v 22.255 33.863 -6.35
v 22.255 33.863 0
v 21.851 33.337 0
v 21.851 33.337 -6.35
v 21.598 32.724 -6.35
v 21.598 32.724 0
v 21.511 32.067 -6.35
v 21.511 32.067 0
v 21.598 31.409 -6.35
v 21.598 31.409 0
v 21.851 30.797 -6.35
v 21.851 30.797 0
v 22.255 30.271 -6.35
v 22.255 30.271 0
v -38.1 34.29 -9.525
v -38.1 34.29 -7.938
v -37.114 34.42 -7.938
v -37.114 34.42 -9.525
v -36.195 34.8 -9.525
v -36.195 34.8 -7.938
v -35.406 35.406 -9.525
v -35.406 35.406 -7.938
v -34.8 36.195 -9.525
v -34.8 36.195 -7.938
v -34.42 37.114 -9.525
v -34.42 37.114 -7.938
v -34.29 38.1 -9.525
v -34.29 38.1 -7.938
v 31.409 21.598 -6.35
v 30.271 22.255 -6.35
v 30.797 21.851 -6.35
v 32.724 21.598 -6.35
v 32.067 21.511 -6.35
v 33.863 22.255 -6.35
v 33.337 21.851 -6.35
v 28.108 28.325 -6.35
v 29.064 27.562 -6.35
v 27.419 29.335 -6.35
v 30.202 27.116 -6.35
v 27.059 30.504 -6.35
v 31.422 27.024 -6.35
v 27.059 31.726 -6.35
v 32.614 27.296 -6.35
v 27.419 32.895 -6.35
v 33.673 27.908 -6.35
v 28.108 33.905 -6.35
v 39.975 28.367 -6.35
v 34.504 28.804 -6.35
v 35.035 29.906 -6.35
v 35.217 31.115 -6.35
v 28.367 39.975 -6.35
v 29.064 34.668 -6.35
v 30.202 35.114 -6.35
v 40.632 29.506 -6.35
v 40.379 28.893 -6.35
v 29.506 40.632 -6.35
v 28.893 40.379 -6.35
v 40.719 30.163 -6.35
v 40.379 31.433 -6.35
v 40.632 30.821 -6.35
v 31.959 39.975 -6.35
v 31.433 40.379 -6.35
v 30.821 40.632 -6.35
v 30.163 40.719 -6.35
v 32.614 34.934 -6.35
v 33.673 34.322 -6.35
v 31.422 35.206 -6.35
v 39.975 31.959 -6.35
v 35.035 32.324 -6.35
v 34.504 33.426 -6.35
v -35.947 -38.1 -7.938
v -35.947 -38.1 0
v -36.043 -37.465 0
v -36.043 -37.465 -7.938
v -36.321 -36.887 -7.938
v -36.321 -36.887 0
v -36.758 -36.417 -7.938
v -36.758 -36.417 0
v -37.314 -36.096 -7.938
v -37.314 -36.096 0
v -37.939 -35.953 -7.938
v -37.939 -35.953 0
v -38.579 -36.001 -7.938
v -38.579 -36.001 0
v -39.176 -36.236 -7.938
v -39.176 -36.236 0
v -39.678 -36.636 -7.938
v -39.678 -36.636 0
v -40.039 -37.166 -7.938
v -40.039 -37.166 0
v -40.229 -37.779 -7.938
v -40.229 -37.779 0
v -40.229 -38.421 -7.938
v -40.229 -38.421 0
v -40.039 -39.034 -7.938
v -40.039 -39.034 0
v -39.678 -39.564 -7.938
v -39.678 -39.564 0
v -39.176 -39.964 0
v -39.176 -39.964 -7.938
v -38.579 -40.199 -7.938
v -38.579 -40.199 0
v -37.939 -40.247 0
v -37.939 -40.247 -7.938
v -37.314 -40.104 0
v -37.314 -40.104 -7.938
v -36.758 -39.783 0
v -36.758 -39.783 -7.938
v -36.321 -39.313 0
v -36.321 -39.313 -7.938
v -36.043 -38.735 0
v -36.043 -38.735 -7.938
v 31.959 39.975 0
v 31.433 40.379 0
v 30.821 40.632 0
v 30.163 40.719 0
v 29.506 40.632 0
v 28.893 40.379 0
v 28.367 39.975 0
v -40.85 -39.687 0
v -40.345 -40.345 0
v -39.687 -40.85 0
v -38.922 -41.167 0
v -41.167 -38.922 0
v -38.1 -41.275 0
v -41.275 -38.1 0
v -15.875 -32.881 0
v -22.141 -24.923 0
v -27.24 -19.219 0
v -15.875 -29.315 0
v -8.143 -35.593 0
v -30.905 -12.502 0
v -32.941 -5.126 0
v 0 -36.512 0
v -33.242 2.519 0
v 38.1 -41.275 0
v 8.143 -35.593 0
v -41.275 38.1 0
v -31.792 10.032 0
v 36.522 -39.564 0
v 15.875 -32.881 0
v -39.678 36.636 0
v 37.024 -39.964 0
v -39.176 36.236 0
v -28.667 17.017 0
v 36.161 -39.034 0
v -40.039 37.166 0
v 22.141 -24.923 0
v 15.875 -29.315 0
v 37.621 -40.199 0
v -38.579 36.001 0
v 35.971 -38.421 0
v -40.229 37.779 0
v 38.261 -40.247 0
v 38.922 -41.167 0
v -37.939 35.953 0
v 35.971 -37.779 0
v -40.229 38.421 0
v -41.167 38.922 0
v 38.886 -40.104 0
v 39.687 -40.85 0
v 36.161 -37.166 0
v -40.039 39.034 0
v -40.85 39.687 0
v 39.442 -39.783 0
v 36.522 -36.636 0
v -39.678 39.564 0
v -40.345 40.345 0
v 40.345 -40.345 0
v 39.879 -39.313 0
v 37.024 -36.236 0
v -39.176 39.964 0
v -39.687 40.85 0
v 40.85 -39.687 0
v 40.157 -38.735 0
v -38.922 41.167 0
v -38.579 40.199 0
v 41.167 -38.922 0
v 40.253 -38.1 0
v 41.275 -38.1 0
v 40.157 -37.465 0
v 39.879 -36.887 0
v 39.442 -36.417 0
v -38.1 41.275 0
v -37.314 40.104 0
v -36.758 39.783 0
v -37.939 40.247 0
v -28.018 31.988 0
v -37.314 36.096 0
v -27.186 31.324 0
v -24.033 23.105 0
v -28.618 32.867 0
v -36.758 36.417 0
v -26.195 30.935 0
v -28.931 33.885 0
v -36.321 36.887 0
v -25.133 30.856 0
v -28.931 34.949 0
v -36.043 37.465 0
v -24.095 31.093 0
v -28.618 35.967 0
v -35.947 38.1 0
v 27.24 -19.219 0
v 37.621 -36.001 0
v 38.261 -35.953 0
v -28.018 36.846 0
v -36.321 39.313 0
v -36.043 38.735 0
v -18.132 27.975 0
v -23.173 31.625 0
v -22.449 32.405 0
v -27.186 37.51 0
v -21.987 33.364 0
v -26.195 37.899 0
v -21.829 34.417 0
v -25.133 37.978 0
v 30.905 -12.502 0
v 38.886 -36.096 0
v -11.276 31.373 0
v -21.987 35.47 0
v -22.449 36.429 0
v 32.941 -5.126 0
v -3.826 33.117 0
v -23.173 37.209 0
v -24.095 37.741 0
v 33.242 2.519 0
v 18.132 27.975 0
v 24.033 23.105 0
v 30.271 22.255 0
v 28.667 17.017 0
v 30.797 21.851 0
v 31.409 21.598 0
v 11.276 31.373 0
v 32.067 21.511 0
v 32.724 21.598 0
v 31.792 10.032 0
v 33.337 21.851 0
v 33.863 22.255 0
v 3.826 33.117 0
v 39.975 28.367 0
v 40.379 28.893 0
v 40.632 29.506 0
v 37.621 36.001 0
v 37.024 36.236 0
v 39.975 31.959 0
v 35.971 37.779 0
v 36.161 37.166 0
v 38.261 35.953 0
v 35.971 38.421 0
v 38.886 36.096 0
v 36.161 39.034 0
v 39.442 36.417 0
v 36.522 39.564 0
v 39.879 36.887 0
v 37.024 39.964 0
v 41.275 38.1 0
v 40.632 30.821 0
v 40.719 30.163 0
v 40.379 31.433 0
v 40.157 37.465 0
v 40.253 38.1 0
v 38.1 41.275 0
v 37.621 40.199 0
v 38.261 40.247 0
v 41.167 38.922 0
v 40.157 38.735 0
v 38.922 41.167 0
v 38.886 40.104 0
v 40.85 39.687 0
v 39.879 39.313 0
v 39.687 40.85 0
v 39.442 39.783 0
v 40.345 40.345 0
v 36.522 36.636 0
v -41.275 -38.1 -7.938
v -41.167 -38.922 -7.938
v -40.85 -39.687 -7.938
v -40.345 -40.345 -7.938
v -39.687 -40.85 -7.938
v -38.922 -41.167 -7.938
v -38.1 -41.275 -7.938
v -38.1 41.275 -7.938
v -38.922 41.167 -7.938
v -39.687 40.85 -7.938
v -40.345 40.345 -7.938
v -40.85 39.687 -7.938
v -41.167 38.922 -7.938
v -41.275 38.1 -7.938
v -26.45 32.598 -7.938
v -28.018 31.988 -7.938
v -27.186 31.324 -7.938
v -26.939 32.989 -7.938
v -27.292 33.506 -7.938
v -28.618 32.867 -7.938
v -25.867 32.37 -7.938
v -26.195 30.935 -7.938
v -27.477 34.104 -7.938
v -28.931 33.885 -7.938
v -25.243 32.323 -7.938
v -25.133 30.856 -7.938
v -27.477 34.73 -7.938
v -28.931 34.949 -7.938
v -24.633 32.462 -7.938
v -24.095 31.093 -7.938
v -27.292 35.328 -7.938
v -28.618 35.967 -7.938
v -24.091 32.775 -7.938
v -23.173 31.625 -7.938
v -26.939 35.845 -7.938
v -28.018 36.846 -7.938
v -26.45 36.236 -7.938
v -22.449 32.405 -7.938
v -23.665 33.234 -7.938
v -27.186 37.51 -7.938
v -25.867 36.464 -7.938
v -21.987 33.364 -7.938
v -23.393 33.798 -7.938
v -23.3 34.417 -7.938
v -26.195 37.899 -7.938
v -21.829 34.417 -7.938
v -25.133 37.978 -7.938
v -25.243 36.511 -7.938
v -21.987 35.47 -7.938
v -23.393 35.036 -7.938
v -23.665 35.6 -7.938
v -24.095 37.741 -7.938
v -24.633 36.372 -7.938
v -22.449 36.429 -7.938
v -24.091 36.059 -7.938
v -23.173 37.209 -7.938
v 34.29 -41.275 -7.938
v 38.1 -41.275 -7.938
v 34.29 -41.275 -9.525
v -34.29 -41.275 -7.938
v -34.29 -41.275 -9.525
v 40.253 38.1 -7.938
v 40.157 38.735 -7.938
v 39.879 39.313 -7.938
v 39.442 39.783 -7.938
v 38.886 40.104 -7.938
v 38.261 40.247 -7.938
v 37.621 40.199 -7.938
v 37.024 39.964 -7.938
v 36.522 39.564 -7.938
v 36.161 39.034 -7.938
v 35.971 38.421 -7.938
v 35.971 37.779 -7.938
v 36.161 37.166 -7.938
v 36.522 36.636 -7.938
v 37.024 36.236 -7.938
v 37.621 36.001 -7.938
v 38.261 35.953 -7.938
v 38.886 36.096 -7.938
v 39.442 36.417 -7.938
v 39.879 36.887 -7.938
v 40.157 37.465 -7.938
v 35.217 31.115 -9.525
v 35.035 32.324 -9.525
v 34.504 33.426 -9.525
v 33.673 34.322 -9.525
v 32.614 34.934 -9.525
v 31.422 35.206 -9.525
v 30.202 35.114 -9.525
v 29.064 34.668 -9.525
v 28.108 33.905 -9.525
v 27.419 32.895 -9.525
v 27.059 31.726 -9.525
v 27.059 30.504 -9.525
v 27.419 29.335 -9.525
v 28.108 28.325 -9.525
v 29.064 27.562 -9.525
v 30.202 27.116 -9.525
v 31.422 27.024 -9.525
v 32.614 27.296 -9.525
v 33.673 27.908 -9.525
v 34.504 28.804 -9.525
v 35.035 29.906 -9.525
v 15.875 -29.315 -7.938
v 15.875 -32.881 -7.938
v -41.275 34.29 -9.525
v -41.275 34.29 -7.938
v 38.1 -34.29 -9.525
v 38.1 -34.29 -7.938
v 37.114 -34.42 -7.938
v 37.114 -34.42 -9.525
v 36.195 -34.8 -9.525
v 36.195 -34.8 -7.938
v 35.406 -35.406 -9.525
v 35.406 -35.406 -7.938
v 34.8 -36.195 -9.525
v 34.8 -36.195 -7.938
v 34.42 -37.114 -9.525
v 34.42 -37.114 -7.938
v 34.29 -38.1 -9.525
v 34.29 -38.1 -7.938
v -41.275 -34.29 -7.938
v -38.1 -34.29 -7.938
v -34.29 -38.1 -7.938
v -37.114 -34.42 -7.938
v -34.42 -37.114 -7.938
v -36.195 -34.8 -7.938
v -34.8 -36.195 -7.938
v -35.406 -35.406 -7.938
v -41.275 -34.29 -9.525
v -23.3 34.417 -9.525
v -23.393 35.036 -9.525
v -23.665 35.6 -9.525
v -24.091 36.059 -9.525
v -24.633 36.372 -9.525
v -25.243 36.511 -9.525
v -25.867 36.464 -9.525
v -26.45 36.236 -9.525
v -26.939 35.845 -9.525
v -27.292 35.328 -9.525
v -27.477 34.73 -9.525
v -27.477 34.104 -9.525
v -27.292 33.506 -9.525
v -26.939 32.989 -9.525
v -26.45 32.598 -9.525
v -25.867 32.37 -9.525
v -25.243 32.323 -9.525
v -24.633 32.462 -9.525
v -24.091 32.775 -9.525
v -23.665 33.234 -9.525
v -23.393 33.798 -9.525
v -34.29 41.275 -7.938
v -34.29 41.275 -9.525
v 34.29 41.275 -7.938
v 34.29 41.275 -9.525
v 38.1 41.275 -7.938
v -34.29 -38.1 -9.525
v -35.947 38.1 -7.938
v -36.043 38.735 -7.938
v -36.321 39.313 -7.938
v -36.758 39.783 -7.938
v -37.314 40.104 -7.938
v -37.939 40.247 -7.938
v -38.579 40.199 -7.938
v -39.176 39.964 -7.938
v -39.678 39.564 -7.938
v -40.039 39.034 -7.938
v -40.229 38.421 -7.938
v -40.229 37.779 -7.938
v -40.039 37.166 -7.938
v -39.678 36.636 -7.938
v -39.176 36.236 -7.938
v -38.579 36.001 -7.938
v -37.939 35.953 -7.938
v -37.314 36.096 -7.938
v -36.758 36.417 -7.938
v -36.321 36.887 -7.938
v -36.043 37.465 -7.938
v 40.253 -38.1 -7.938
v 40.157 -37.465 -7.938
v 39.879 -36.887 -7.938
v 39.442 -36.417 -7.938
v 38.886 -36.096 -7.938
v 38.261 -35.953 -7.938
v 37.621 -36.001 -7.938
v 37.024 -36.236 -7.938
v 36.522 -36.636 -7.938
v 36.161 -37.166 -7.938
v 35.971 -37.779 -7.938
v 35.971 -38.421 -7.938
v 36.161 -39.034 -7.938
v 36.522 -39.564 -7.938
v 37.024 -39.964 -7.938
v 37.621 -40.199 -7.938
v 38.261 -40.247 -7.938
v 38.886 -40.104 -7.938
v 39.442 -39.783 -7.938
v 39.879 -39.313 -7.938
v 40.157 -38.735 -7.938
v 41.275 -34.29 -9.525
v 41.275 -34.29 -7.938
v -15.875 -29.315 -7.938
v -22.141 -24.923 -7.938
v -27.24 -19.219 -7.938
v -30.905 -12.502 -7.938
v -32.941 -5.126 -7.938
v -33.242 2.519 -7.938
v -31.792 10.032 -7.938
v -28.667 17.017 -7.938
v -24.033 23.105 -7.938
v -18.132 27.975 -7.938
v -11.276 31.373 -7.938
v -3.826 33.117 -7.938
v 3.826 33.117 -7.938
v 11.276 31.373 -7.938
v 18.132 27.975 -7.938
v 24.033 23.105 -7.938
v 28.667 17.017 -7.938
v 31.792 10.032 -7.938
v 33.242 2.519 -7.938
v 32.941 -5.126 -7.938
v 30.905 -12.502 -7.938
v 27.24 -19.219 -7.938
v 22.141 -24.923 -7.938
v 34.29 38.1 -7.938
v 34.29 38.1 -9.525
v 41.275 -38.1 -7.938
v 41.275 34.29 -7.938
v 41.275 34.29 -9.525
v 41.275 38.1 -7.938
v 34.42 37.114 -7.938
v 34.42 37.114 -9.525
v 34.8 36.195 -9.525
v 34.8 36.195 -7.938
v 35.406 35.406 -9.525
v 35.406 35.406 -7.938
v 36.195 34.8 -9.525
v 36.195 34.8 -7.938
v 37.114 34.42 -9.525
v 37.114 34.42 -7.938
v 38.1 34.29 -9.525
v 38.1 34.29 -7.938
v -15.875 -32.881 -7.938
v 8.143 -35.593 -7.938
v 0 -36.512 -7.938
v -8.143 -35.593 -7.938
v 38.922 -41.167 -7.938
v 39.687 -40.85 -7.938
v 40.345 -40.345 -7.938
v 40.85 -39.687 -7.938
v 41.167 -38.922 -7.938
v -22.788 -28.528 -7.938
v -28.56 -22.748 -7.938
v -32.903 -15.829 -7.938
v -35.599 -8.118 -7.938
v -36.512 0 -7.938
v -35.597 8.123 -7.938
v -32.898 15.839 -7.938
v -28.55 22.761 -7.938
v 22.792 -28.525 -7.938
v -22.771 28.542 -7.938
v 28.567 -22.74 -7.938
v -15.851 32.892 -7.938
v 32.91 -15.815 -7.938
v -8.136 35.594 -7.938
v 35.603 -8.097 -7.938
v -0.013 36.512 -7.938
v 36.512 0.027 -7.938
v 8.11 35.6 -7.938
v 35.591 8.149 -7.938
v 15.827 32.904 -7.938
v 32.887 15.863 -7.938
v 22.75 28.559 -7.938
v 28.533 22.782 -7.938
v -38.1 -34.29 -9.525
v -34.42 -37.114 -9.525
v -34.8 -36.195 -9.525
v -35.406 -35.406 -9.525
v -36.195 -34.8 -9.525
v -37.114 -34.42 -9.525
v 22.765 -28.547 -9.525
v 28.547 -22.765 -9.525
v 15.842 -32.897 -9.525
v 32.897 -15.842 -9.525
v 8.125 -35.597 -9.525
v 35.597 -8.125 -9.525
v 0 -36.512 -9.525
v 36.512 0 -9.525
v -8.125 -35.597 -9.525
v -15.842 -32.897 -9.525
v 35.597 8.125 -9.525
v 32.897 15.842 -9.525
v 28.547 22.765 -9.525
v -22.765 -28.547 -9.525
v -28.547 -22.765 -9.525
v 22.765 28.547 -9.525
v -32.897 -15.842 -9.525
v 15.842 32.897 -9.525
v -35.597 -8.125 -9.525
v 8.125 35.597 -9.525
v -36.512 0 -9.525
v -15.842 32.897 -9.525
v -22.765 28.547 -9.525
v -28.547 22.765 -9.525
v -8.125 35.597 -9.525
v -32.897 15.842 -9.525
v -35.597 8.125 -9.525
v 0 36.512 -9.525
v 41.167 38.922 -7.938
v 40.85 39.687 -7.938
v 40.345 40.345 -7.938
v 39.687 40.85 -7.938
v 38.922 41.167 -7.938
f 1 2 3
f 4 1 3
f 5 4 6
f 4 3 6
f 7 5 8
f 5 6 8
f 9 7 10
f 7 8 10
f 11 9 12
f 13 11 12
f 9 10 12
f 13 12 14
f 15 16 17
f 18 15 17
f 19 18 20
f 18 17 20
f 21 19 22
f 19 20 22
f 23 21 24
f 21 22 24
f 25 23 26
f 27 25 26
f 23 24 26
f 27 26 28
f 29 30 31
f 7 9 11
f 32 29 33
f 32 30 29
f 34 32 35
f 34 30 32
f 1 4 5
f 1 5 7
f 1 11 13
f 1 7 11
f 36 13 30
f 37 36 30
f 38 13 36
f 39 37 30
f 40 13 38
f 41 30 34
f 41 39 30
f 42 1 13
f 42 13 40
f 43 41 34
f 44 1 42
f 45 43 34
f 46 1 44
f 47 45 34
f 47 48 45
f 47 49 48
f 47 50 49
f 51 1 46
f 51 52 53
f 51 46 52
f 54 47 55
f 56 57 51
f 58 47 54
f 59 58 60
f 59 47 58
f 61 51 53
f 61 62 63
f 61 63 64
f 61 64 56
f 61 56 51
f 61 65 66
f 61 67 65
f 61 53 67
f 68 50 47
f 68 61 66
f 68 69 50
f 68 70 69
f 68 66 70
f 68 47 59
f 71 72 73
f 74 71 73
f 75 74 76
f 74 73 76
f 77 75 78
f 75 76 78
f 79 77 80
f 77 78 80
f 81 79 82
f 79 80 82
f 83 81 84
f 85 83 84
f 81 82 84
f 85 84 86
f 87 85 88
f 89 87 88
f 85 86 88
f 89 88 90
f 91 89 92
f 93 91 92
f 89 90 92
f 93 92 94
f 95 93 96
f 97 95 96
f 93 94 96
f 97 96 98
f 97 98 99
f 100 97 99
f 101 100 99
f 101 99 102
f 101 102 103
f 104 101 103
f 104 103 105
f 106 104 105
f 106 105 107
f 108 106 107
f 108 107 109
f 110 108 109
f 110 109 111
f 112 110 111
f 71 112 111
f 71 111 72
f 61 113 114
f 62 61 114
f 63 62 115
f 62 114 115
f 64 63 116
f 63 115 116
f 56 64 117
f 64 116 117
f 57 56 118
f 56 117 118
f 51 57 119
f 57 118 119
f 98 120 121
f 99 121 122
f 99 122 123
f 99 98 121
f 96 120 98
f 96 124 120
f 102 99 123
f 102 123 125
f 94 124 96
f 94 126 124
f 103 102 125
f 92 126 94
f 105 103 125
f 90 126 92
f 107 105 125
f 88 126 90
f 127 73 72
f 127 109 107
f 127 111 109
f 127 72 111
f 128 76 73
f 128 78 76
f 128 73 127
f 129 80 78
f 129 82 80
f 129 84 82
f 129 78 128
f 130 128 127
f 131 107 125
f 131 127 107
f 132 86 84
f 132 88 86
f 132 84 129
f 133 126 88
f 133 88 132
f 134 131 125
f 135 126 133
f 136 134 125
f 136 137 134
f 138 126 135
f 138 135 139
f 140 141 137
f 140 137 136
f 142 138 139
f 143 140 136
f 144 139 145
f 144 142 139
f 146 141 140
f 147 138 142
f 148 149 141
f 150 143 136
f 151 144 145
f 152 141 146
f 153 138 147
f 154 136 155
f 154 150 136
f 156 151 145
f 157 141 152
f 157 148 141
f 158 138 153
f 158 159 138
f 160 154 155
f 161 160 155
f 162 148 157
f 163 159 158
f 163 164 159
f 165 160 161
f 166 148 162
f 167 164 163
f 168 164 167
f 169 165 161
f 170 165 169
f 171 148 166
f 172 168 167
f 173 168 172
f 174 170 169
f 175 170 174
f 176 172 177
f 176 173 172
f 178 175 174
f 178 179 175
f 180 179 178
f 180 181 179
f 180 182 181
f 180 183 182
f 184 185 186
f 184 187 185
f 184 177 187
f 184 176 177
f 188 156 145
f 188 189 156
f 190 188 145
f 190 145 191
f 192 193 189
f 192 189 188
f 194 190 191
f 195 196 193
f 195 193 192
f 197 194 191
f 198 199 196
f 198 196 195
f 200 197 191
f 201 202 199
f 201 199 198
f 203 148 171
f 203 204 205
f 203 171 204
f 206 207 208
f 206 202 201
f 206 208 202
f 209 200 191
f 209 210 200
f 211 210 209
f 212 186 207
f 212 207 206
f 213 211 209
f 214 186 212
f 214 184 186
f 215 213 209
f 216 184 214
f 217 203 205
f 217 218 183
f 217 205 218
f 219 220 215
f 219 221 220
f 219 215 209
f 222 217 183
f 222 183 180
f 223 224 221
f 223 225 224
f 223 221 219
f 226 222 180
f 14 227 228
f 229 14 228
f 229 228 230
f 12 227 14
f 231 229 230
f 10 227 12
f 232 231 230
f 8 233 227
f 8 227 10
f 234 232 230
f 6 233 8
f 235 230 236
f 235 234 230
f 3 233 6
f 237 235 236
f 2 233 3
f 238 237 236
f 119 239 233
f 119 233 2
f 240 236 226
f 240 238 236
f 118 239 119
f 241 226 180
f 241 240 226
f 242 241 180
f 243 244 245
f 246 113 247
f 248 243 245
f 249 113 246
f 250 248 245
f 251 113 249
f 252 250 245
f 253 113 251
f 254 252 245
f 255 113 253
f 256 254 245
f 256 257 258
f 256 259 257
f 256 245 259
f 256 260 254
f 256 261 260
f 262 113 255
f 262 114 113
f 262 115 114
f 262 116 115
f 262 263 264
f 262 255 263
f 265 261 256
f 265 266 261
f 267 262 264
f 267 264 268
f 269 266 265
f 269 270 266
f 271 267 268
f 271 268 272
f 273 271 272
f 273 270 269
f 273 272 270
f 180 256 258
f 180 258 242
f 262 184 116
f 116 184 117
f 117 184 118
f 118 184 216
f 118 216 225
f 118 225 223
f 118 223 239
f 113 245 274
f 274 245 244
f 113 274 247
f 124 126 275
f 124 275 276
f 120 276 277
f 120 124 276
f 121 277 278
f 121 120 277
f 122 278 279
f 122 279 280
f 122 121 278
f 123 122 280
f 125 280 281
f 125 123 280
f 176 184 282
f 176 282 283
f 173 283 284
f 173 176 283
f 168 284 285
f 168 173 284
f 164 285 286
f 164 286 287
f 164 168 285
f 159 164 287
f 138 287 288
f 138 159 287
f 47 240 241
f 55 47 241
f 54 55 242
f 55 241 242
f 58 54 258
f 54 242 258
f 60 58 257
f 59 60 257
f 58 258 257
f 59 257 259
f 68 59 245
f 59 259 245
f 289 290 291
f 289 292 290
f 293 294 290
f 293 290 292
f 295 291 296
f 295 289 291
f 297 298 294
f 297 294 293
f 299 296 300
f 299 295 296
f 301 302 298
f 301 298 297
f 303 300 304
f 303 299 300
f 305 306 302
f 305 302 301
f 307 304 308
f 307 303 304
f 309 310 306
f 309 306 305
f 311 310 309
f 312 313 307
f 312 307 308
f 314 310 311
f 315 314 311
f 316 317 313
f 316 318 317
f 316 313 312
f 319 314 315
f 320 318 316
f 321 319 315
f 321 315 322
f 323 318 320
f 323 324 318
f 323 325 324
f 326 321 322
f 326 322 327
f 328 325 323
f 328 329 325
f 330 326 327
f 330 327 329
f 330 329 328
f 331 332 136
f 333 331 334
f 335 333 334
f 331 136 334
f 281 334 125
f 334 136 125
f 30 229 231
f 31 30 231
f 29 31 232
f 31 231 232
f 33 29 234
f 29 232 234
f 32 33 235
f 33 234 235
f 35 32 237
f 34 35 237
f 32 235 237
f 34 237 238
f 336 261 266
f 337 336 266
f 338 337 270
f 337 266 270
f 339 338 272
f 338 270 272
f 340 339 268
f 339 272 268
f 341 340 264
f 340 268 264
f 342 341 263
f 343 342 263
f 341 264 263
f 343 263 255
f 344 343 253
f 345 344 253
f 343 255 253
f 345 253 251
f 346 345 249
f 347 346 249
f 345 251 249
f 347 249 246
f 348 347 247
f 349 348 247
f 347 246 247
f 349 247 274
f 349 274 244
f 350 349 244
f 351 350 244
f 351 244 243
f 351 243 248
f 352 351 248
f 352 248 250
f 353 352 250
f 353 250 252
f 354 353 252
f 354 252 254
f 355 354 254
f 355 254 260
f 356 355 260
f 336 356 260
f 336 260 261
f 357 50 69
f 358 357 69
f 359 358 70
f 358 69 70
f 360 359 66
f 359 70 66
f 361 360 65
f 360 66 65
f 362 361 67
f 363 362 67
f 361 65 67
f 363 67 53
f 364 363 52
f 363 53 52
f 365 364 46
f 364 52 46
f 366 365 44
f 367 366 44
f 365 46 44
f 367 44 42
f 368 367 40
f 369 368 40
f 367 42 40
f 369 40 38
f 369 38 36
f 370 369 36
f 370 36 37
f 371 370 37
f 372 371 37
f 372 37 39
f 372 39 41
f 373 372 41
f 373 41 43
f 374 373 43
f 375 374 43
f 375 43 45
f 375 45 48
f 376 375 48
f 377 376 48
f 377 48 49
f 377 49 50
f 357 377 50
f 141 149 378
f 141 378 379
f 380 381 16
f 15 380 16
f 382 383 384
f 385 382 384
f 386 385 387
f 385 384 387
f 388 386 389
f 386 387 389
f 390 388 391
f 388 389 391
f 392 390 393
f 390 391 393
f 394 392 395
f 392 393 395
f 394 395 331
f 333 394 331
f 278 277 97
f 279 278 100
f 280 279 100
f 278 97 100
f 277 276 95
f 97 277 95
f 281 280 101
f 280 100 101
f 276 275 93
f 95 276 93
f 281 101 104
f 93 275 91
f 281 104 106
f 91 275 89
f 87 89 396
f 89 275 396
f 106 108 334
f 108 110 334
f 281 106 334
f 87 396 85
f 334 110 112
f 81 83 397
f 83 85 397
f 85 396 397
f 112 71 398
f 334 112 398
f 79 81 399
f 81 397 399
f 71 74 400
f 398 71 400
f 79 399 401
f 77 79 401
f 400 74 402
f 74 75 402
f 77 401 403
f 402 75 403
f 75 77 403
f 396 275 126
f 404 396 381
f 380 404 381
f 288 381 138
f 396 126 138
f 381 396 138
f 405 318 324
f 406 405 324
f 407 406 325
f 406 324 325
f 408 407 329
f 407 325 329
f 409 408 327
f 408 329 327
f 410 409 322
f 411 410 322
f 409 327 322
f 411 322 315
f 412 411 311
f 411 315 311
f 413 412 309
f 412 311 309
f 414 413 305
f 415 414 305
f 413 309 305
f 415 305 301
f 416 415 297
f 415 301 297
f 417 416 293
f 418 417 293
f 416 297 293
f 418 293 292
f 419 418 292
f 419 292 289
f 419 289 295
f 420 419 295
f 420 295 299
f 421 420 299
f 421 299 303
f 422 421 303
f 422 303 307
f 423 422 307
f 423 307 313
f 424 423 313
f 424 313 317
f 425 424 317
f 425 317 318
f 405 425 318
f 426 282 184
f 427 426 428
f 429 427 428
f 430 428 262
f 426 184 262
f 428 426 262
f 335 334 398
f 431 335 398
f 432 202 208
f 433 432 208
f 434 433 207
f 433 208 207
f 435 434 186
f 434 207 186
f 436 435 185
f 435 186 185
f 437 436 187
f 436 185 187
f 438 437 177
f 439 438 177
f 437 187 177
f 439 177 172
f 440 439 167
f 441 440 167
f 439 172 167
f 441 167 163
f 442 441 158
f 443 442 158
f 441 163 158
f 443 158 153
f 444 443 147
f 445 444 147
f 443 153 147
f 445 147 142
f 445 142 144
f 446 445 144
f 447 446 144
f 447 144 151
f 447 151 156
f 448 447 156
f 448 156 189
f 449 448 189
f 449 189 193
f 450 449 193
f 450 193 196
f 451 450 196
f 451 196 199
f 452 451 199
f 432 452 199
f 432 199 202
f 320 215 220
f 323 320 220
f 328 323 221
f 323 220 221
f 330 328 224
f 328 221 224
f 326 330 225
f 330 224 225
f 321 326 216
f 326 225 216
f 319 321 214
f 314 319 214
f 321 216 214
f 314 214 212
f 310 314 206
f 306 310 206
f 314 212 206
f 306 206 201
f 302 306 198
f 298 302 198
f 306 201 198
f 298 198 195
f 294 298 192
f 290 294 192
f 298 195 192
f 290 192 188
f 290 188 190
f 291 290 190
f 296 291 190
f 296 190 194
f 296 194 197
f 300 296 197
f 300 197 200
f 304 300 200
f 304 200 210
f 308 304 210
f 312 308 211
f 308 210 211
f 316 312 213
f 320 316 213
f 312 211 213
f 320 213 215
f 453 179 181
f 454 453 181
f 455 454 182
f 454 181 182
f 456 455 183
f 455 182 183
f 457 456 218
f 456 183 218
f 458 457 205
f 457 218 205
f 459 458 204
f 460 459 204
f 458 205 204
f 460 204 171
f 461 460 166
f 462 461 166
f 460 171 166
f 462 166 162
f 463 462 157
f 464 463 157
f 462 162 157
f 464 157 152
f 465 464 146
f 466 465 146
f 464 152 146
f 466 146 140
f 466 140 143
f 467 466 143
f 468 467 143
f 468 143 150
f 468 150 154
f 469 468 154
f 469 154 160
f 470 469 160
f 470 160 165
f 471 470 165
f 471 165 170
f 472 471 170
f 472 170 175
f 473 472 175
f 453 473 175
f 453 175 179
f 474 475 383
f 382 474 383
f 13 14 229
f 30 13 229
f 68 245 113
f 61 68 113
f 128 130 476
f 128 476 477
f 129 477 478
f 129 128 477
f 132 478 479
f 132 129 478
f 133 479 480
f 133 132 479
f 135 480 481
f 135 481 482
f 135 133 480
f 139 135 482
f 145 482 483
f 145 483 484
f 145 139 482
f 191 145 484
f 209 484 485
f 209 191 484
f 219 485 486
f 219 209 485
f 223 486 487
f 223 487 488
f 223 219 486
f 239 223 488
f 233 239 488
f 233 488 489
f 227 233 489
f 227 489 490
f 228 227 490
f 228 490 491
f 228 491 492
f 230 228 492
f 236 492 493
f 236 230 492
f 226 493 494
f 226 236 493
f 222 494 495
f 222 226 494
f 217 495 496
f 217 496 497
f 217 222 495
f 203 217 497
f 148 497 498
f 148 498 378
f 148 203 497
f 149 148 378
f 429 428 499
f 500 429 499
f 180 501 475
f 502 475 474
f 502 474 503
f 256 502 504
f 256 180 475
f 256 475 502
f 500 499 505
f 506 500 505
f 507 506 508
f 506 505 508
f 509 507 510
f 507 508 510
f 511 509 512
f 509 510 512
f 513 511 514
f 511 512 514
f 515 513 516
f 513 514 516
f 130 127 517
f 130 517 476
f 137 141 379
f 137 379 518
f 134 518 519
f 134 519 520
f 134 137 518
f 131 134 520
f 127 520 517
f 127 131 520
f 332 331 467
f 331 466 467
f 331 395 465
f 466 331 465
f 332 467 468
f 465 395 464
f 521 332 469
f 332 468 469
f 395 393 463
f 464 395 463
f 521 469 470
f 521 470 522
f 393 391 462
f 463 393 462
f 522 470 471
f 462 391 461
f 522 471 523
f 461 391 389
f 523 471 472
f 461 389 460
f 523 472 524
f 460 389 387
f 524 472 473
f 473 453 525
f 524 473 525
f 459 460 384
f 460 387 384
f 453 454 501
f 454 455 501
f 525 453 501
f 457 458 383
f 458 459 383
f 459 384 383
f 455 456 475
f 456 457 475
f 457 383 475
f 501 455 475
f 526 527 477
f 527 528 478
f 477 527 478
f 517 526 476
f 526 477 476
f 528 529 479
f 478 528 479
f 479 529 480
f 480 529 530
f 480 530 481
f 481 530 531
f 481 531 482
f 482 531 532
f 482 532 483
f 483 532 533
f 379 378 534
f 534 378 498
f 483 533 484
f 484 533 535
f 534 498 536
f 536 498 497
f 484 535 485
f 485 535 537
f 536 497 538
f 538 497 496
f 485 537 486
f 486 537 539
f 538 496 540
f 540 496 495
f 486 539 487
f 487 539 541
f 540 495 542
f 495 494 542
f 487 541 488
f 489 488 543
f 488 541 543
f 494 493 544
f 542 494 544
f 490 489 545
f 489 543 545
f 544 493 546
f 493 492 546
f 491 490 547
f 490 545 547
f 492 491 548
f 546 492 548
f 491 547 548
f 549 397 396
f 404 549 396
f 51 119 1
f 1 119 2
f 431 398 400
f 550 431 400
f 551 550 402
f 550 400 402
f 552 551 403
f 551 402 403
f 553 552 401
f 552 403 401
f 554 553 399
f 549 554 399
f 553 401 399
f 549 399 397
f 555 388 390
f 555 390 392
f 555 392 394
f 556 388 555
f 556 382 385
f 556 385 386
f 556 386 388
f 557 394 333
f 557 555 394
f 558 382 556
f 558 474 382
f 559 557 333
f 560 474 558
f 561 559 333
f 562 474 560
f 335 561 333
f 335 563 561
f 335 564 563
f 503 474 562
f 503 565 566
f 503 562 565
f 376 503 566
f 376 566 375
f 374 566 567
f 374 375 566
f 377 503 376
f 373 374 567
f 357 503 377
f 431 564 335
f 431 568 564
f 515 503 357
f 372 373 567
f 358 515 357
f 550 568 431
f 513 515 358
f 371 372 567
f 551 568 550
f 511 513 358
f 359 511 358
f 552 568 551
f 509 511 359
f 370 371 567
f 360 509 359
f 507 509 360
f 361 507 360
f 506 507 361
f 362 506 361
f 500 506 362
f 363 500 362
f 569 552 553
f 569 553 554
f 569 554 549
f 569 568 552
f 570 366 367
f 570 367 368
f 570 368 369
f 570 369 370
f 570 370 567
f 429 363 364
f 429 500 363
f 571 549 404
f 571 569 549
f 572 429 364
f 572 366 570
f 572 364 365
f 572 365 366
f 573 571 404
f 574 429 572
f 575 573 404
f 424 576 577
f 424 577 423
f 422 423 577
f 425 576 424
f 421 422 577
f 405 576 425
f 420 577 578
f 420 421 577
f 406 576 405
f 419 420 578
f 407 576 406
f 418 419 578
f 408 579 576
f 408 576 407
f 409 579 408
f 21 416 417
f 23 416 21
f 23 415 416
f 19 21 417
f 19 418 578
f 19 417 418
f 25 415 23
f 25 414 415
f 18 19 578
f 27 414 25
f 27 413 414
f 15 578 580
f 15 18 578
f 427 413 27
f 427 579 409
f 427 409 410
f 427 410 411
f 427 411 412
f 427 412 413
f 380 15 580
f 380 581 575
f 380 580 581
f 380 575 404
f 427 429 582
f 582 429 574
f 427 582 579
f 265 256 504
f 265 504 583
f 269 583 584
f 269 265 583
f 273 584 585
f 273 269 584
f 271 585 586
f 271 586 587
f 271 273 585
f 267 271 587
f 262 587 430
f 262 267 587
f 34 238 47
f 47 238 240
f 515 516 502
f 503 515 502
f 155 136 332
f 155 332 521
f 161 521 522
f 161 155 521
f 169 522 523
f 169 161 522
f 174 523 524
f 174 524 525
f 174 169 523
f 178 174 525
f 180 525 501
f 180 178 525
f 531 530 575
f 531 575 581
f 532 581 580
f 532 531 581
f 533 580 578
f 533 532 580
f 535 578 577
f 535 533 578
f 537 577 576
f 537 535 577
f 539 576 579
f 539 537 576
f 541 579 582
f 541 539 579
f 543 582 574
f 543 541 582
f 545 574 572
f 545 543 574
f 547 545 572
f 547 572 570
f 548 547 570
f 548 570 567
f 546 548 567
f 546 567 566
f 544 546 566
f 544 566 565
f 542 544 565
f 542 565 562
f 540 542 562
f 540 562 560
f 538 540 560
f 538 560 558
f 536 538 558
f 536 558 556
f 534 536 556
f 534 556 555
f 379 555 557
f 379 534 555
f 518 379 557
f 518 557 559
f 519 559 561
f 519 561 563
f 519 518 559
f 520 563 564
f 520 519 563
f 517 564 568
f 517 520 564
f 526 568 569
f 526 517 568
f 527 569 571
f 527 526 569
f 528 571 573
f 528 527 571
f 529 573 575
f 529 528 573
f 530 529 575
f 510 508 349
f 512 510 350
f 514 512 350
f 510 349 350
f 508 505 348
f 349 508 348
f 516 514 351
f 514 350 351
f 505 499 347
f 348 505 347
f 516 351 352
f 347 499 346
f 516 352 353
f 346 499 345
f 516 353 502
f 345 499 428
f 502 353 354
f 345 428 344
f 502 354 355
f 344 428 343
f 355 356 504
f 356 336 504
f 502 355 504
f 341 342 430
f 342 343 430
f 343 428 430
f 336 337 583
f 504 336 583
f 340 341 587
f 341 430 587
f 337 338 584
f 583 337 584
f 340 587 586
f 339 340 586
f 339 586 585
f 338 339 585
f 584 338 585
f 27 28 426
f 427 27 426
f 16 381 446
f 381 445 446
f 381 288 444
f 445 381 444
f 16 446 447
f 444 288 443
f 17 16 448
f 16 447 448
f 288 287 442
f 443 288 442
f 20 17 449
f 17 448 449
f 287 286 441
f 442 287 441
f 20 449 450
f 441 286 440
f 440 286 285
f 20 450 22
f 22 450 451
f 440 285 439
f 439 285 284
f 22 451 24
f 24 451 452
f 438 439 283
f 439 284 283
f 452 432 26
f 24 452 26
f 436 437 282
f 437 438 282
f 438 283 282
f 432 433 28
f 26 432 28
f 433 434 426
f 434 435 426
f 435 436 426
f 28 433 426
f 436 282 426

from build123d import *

# Parameters (mm, degrees)
BOSS_EXTRUDE1_DEPTH      = 7.9375
SKETCH2_R                = 36.5125
BOSS_EXTRUDE2_DEPTH      = 1.5875
F_6_CLEARANCE_HOLE1_D    = 4.3053
SKETCH5_R                = 3.57124
CUT_EXTRUDE1_DEPTH       = 7.9375
CUT_EXTRUDE2_REACH       = 3.588
SKETCH6_R                = 2.1
CUT_EXTRUDE3_DEPTH       = 6.35
F_5_16_CLEARANCE_HOLE1_D = 8.2042


with BuildPart() as part:
    # Sketch1 → Boss-Extrude1 (new body)
    with BuildSketch(Plane.XY):
        with BuildLine():
            Line((-38.1, -41.275), (38.1, -41.275))
            ThreePointArc((38.1, -41.275), (40.34506403, -40.34506403), (41.275, -38.1))
            Line((41.275, -38.1), (41.275, 38.1))
            ThreePointArc((41.275, 38.1), (40.34506403, 40.34506403), (38.1, 41.275))
            Line((38.1, 41.275), (-38.1, 41.275))
            ThreePointArc((-38.1, 41.275), (-40.34506403, 40.34506403), (-41.275, 38.1))
            Line((-41.275, 38.1), (-41.275, -38.1))
            ThreePointArc((-41.275, -38.1), (-40.34506403, -40.34506403), (-38.1, -41.275))
        make_face()
        with BuildLine():
            Line((15.875, -29.315069184), (15.875, -32.880800344))
            ThreePointArc((15.875, -32.880800344), (0, -36.5125), (-15.875, -32.880800344))
            Line((-15.875, -32.880800344), (-15.875, -29.315069184))
            ThreePointArc((-15.875, -29.315069184), (0, 33.3375), (15.875, -29.315069184))
        make_face(mode=Mode.SUBTRACT)
    extrude(amount=-BOSS_EXTRUDE1_DEPTH)

    # Sketch2 → Boss-Extrude2 (add)
    with BuildSketch(Plane(origin=(0, 0, -7.9375), x_dir=(-1, 0, 0), z_dir=(0, 0, -1))):
        with BuildLine():
            Line((-34.290000001, -38.1), (-34.290000001, -41.275))
            Line((-34.290000001, -41.275), (34.289999999, -41.275))
            Line((34.289999999, -41.275), (34.289999999, -38.1))
            ThreePointArc((34.289999999, -38.1), (35.405923163, -35.405923164), (38.099999999, -34.29))
            Line((38.099999999, -34.29), (41.274999999, -34.29))
            Line((41.274999999, -34.29), (41.274999999, 34.29))
            Line((41.274999999, 34.29), (38.099999999, 34.29))
            ThreePointArc((38.099999999, 34.29), (35.405923163, 35.405923164), (34.289999999, 38.1))
            Line((34.289999999, 38.1), (34.289999999, 41.275))
            Line((34.289999999, 41.275), (-34.290000001, 41.275))
            Line((-34.290000001, 41.275), (-34.290000001, 38.1))
            ThreePointArc((-34.290000001, 38.1), (-35.405923165, 35.405923164), (-38.100000001, 34.29))
            Line((-38.100000001, 34.29), (-41.275000001, 34.29))
            Line((-41.275000001, 34.29), (-41.275000001, -34.29))
            Line((-41.275000001, -34.29), (-38.100000001, -34.29))
            ThreePointArc((-38.100000001, -34.29), (-35.405923165, -35.405923164), (-34.290000001, -38.1))
        make_face()
        Circle(SKETCH2_R, mode=Mode.SUBTRACT)
    extrude(amount=BOSS_EXTRUDE2_DEPTH)

    # #6 Clearance Hole1 (through all)
    with Locations(Plane(origin=(0, 0, -7.9375), x_dir=(-1, 0, 0), z_dir=(0, 0, -1))):
        with Locations((-38.1, 38.1), (38.099999999, 38.1), (38.1, -38.1), (-38.1, -38.1)):
            Hole(F_6_CLEARANCE_HOLE1_D / 2)

    # Sketch5 → Cut-Extrude1 (cut)
    with BuildSketch(Plane.XY):
        with Locations((-25.4, 34.417)):
            Circle(SKETCH5_R)
    extrude(amount=-CUT_EXTRUDE1_DEPTH, mode=Mode.SUBTRACT)

    # Sketch6 → Cut-Extrude2 (cut, up to next)
    with BuildSketch(Plane.XY.offset(-7.9375), mode=Mode.PRIVATE) as cut_extrude2_sk1:
        with Locations((-25.4, 34.417)):
            Circle(SKETCH6_R)
    cut_extrude2_tool1 = extrude(cut_extrude2_sk1.sketch, amount=-CUT_EXTRUDE2_REACH, mode=Mode.PRIVATE) & part.part
    add(cut_extrude2_tool1.solids().sort_by_distance((-25.4, 34.417, -7.9375))[0], mode=Mode.SUBTRACT)

    # Sketch7 → Cut-Extrude3 (cut)
    with BuildSketch(Plane.XY):
        with BuildLine():
            Line((22.254952032, 30.270714503), (30.270714503, 22.254952032))
            ThreePointArc((30.270714503, 22.254952032), (32.066765727, 21.511003256), (33.862816952, 22.254952032))
            Line((33.862816952, 22.254952032), (39.975047968, 28.367183048))
            ThreePointArc((39.975047968, 28.367183048), (40.718996744, 30.163234273), (39.975047968, 31.959285497))
            Line((39.975047968, 31.959285497), (31.959285497, 39.975047968))
            ThreePointArc((31.959285497, 39.975047968), (30.163234273, 40.718996744), (28.367183048, 39.975047968))
            Line((28.367183048, 39.975047968), (22.254952032, 33.862816952))
            ThreePointArc((22.254952032, 33.862816952), (21.511003256, 32.066765727), (22.254952032, 30.270714503))
        make_face()
    extrude(amount=-CUT_EXTRUDE3_DEPTH, mode=Mode.SUBTRACT)

    # 5/16 Clearance Hole1 (through all)
    with Locations(Plane(origin=(0, 0, -9.525), x_dir=(-1, 0, 0), z_dir=(0, 0, -1))):
        with Locations((-31.115, 31.115)):
            Hole(F_5_16_CLEARANCE_HOLE1_D / 2)


solid = part.part
